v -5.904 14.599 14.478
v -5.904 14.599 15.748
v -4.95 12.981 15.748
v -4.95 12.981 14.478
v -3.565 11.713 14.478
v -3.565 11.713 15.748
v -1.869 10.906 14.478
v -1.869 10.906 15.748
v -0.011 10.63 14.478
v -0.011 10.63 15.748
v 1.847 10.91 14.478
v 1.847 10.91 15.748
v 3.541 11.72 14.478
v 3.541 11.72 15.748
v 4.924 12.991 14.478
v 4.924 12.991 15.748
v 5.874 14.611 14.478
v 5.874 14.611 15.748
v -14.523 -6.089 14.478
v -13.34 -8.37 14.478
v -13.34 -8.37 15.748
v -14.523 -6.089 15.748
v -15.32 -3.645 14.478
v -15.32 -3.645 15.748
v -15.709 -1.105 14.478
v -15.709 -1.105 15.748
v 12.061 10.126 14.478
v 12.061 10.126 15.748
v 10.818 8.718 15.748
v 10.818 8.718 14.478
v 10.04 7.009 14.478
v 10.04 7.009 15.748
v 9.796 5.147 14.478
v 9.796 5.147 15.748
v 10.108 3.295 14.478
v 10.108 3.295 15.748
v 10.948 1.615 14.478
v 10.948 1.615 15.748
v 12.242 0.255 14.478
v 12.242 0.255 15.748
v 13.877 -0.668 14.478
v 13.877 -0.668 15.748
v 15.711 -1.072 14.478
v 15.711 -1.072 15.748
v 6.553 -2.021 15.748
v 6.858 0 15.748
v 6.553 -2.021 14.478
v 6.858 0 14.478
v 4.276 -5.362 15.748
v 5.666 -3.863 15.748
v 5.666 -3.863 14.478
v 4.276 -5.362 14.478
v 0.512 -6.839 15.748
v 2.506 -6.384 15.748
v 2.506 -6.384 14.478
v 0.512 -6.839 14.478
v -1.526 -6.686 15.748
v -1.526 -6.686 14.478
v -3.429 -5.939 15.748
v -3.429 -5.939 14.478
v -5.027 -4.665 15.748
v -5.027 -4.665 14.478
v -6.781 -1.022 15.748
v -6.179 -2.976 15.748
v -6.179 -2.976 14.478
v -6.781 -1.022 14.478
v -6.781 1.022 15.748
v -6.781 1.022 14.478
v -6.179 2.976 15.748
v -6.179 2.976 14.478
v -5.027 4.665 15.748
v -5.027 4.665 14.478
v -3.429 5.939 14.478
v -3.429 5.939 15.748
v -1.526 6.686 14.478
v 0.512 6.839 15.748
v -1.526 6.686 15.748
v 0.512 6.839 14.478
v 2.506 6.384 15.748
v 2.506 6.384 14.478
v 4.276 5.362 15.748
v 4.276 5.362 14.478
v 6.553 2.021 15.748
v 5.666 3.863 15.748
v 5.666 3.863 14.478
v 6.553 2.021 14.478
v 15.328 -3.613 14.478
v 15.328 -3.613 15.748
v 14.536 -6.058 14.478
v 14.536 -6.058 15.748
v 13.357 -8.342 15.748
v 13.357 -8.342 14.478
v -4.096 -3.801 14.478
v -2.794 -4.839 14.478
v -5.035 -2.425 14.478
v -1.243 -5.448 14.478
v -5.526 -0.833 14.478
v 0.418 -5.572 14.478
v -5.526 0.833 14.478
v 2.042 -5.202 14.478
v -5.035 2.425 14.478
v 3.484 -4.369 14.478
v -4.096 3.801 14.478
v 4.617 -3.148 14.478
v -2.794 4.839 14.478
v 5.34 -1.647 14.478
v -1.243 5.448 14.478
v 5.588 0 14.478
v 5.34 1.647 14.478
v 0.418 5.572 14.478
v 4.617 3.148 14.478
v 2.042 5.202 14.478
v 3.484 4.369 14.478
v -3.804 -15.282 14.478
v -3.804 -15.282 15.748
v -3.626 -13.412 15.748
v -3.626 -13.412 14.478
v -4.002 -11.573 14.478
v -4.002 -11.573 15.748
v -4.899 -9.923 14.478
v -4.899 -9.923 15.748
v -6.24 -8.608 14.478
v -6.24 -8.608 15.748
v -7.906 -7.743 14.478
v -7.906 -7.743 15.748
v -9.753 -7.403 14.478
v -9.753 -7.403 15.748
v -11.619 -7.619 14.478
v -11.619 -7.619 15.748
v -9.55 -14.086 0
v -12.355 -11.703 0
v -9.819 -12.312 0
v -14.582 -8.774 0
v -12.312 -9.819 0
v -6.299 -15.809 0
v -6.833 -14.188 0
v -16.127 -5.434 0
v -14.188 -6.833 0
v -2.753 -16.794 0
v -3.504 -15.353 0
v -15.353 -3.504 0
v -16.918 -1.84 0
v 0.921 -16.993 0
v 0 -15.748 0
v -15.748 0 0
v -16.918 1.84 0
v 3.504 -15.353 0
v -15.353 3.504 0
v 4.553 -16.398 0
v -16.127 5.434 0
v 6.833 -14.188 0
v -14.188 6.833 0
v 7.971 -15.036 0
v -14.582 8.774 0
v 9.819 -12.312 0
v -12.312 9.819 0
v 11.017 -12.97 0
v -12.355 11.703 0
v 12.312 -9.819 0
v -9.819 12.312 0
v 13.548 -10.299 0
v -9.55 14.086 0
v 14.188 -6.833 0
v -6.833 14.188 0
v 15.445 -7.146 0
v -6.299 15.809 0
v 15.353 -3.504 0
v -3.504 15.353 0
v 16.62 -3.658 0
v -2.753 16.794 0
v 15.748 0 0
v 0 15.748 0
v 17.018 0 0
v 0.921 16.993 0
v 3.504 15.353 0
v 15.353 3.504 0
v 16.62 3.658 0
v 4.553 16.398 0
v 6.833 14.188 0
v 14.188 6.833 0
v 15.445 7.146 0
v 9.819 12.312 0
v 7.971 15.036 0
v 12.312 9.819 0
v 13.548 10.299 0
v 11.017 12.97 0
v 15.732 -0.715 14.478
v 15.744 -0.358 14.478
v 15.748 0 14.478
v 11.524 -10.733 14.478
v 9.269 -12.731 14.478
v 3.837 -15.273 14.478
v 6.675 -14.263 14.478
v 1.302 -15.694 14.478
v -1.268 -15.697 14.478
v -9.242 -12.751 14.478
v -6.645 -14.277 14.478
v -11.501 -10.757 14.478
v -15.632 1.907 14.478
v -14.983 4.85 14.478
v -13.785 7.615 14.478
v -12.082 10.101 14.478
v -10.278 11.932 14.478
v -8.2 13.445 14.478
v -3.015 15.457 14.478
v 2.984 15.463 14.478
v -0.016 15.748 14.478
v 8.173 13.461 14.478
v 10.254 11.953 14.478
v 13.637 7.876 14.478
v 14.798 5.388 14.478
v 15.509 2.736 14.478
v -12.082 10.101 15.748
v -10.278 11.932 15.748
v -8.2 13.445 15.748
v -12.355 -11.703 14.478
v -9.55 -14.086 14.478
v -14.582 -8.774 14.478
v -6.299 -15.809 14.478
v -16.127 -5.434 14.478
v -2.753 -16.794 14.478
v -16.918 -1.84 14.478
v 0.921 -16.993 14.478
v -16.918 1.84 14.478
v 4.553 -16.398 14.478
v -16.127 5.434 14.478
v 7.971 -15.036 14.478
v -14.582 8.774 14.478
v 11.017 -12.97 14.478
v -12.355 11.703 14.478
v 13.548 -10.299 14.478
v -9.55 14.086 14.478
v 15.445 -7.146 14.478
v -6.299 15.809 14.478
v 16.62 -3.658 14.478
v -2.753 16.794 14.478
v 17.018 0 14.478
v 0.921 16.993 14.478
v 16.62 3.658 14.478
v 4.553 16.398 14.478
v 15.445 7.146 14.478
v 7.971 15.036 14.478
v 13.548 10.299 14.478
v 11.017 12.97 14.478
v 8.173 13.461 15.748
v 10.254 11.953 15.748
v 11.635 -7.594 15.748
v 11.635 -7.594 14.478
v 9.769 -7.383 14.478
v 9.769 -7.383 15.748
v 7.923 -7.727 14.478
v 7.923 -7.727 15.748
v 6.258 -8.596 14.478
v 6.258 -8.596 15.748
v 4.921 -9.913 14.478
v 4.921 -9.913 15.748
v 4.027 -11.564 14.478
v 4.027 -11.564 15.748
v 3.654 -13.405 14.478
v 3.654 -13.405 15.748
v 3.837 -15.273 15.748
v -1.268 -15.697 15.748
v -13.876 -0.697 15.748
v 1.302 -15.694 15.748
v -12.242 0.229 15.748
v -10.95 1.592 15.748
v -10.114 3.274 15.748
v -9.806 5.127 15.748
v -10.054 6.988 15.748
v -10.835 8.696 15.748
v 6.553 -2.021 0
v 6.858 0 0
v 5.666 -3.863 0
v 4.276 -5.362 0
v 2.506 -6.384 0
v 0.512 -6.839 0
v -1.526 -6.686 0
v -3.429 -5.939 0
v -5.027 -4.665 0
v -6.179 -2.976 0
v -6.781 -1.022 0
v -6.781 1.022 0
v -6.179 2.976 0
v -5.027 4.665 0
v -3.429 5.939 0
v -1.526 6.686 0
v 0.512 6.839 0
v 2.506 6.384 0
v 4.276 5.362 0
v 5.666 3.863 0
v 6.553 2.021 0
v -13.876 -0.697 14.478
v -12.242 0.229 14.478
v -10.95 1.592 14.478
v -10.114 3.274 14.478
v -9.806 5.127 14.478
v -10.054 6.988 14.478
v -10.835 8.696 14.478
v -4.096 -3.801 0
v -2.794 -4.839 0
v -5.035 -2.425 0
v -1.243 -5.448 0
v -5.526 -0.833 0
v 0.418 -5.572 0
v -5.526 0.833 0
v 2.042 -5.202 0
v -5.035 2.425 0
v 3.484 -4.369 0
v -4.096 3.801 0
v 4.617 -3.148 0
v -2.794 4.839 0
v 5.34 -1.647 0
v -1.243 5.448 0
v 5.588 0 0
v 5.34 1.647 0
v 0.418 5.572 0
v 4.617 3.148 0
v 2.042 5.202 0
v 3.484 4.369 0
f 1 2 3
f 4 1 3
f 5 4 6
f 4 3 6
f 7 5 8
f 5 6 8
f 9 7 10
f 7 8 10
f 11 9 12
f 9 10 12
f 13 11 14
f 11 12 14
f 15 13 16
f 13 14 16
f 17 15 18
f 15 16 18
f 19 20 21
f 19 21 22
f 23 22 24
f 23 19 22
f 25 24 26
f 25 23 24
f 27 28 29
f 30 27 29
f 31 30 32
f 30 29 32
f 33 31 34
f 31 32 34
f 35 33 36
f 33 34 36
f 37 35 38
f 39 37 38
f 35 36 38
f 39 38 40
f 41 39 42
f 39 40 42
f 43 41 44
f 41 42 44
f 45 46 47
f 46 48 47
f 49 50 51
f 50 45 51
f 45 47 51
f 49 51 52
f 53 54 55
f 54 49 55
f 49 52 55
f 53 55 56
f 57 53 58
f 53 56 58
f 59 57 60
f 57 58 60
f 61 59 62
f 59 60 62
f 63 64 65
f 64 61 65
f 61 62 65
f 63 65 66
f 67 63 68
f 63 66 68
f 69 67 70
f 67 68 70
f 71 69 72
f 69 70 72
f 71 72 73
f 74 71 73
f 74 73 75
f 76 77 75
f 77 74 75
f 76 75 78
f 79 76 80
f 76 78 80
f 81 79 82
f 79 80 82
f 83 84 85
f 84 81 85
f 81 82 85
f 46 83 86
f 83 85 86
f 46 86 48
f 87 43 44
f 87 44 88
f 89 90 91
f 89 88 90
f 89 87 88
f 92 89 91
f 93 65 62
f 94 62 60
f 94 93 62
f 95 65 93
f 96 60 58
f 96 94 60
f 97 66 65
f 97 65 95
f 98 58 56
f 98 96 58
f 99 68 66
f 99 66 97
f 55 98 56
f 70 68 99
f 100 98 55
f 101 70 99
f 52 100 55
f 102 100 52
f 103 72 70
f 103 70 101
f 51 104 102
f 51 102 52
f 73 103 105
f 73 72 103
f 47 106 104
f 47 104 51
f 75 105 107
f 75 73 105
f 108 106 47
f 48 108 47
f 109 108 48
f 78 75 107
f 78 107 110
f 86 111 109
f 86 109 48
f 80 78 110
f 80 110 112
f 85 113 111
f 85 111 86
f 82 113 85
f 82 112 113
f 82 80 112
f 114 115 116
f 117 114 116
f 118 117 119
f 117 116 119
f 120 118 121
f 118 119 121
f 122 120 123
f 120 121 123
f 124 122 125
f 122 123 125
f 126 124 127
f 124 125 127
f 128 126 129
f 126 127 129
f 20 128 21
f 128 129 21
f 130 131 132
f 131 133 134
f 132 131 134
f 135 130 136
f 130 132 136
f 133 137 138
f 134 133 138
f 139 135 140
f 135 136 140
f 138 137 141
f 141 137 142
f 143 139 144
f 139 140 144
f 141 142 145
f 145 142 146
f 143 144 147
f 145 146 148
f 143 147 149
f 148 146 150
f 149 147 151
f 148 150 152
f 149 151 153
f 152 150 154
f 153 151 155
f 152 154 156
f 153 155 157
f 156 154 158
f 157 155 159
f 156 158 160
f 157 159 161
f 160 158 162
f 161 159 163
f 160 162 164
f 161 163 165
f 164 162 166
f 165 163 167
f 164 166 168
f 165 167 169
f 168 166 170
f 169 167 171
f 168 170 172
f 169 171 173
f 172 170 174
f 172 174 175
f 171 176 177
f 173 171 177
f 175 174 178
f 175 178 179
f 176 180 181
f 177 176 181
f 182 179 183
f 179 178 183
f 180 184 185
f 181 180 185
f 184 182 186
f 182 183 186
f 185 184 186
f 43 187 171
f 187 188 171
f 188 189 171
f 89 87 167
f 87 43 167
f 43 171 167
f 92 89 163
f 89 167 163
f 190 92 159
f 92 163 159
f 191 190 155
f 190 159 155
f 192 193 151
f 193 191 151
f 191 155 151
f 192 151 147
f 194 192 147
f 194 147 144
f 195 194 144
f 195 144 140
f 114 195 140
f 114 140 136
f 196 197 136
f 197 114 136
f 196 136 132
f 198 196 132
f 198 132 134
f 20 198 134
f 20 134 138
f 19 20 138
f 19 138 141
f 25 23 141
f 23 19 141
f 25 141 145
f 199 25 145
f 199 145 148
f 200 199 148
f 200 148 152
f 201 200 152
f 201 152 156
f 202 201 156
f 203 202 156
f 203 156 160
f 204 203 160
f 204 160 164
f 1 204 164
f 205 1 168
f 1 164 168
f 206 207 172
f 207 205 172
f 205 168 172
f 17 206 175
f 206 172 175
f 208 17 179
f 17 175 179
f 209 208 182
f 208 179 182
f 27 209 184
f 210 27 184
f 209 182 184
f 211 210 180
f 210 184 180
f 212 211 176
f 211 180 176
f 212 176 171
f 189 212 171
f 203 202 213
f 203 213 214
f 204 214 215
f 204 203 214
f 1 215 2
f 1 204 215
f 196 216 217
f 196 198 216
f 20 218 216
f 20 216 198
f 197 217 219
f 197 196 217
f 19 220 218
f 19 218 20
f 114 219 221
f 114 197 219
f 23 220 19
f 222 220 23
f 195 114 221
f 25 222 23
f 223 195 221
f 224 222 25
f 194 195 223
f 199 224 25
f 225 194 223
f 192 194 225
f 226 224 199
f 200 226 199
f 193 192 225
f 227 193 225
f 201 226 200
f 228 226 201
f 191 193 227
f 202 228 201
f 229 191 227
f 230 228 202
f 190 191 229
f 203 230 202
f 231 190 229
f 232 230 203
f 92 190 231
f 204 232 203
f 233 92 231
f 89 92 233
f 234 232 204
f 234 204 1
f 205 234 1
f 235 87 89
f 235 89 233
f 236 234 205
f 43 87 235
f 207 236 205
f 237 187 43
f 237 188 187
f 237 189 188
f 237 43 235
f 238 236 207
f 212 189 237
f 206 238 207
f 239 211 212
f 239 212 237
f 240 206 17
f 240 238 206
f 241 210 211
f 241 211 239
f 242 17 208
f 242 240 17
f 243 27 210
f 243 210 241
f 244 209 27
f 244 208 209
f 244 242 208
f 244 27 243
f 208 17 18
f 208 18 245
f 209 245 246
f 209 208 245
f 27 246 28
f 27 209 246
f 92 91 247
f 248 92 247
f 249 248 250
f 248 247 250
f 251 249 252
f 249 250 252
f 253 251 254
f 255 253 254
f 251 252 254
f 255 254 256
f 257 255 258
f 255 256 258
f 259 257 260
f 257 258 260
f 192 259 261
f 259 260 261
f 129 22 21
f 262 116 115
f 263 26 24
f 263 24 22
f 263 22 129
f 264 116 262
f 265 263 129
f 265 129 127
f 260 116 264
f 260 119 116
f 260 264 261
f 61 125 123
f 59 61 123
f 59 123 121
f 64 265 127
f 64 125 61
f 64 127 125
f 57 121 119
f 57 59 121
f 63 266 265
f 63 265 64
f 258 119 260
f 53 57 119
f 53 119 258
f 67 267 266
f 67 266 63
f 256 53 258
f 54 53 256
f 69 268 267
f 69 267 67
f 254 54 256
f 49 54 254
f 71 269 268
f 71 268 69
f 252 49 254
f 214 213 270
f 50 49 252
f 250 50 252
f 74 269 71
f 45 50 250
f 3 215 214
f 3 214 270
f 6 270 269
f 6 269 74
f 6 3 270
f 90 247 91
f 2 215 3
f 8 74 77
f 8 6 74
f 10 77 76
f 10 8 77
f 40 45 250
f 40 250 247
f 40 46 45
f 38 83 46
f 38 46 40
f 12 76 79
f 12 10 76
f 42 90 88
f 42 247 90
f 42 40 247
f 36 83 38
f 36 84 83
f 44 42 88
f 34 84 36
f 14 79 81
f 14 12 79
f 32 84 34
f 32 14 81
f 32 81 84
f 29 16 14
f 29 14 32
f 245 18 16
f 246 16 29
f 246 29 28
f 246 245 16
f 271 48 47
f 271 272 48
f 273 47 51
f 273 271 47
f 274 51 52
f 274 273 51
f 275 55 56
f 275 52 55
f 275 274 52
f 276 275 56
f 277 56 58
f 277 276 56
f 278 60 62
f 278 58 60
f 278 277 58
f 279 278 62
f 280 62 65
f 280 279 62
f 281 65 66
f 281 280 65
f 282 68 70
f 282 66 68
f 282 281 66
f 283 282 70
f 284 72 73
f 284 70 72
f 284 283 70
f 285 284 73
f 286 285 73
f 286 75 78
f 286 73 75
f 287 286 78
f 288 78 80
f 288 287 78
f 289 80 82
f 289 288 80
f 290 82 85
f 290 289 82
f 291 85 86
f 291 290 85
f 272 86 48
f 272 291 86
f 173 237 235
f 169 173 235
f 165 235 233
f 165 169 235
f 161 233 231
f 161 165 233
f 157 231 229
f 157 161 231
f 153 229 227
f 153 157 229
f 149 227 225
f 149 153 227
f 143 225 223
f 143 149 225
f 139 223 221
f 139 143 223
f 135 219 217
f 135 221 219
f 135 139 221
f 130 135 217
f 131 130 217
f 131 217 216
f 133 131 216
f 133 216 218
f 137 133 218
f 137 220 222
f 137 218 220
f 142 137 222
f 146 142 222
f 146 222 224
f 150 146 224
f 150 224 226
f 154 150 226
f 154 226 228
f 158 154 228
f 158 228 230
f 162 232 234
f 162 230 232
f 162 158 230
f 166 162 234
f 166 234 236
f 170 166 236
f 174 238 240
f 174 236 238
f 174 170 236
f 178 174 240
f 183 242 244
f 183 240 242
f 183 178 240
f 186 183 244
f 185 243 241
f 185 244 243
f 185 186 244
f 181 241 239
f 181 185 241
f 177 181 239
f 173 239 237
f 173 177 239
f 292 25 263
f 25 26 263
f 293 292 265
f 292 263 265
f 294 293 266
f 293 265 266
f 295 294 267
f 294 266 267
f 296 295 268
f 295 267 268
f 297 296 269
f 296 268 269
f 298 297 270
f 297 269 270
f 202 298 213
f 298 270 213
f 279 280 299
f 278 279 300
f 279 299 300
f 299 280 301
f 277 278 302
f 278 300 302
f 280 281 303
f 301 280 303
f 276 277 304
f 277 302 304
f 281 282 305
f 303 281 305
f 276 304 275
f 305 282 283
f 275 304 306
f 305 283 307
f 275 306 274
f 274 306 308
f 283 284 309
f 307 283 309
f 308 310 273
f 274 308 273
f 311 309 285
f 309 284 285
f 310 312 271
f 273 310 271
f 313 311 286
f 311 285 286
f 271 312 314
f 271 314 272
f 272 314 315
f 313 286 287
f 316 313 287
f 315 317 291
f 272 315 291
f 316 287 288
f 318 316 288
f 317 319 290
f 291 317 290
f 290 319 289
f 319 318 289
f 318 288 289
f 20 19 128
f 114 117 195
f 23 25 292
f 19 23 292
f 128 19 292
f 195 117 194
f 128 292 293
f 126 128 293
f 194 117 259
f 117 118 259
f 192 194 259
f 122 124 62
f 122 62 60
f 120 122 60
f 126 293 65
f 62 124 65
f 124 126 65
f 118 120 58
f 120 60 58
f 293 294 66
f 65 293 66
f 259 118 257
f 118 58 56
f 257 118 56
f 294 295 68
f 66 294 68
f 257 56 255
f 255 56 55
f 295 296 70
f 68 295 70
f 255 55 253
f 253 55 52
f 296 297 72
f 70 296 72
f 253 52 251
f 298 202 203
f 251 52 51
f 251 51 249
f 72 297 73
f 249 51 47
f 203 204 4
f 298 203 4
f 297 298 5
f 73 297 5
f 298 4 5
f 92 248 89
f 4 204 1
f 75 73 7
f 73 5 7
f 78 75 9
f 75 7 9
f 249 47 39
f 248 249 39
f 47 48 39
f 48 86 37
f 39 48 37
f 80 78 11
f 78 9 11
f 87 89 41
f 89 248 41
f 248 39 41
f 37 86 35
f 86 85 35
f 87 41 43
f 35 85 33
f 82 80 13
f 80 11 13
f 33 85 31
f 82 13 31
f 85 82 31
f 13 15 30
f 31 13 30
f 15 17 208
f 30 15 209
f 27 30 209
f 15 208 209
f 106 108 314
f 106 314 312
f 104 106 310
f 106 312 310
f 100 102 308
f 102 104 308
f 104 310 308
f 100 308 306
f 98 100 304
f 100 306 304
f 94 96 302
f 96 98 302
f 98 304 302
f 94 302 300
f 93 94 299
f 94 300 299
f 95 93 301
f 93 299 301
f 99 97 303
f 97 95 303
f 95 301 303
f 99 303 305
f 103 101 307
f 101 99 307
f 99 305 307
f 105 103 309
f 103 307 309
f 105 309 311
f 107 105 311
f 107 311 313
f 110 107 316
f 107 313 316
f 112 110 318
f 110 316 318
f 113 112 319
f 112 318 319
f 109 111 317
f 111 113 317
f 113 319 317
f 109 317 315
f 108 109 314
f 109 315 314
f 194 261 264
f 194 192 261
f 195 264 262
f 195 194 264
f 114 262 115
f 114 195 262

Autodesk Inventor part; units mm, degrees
ref_plane "YZ Plane" through (0, 0, 0) normal (1, 0, 0) x (0, 1, 0)
ref_plane "XZ Plane" through (0, 0, 0) normal (0, 1, 0) x (-1, 0, 0)
ref_plane "XY Plane" through (0, 0, 0) normal (0, 0, 1) x (1, 0, 0)
sketch "Sketch1" plane through (0, 0, 0) normal (0, 0, 1) x (1, 0, 0)
  circle A0 centre (0, 0) radius 5.588
  circle A1 centre (0, 0) radius 6.858
  circle A2 centre (0, 0) radius 15.748
  circle A3 centre (0, 0) radius 17.018
  dimension "d0" = 11.176
  dimension "d1" = 1.27
  dimension "d2" = 8.89
  dimension "d3" = 1.27
extrude "Extrusion1" add sketch "Sketch1" along normal blind 14.478
sketch "Sketch2" plane through (0, 0, 14.478) normal (0, 0, 1) x (1, 0, 0)
  circle A0 centre (0, 0) radius 5.588 projected
  circle A1 centre (0, 0) radius 6.858 projected
  circle A2 centre (0, 0) radius 15.748 projected
  circle A3 centre (0, 0) radius 17.018 projected
extrude "Extrusion2" add sketch "Sketch2" along normal blind 1.27 contours A2
sketch "Sketch4" plane through (0, 0, 14.478) normal (0, 0, 1) x (1, 0, 0)
  point P0 (0, 0)
sketch "Sketch6" plane through (0, 0, 15.748) normal (0, 0, 1) x (1, 0, 0)
  arc A0 (-5.904, 14.5994) -> (5.8746, 14.6117) centre (-0.0172, 16.98) ccw
  arc A1 (5.8746, 14.6117) -> (-5.904, 14.5994) centre (0.0005, -0.0013) ccw
  arc A2 (-12.082, 10.101) -> (-15.7101, -1.105) centre (0.0005, -0.0013) ccw
  arc A3 (-15.7101, -1.105) -> (-12.082, 10.101) centre (-16.1551, 5.2294) ccw
  arc A4 (-13.341, -8.3707) -> (-3.8047, -15.284) centre (0.0005, -0.0013) ccw
  arc A5 (-3.8047, -15.284) -> (-13.341, -8.3707) centre (-9.9665, -13.7498) ccw
  arc A6 (3.8375, -15.2761) -> (13.3594, -8.3428) centre (0.0005, -0.0013) ccw
  arc A7 (13.3594, -8.3428) -> (3.8375, -15.2761) centre (9.9962, -13.729) ccw
  arc A8 (15.7134, -1.0722) -> (12.0619, 10.1261) centre (0.0005, -0.0013) ccw
  arc A9 (12.0619, 10.1261) -> (15.7134, -1.0722) centre (16.1452, 5.2631) ccw
  point P0 (0, 0)
  dimension "d10" = 6.35
  dimension "d13" = 360
sketch "Sketch5" plane through (0, 0, 15.748) normal (0, 0, 1) x (1, 0, 0)
  circle A0 centre (0, 0) radius 17.018 projected
  circle A1 centre (0, 0) radius 15.748 projected
  circle A2 centre (0, 0) radius 6.858 projected
  circle A3 centre (0, 0) radius 15.748 projected
  circle A4 centre (0, 0) radius 6.858 projected
  circle A5 centre (0, 0) radius 15.748 projected
  circle A6 centre (0, 0) radius 15.748 projected
  arc A7 (-14.5821, 5.9465) -> (-14.6389, -5.8053) centre (0, 0) ccw
  arc A8 (-14.5821, 5.9465) -> (-14.6389, -5.8053) centre (0, 0) ccw
  arc A9 (-14.6107, 5.876) -> (-14.6389, -5.8053) centre (0, 0) ccw
extrude "Extrusion3" cut sketch "Sketch6" against normal blind 1.27
properties part number "AutomobloxWheel"
